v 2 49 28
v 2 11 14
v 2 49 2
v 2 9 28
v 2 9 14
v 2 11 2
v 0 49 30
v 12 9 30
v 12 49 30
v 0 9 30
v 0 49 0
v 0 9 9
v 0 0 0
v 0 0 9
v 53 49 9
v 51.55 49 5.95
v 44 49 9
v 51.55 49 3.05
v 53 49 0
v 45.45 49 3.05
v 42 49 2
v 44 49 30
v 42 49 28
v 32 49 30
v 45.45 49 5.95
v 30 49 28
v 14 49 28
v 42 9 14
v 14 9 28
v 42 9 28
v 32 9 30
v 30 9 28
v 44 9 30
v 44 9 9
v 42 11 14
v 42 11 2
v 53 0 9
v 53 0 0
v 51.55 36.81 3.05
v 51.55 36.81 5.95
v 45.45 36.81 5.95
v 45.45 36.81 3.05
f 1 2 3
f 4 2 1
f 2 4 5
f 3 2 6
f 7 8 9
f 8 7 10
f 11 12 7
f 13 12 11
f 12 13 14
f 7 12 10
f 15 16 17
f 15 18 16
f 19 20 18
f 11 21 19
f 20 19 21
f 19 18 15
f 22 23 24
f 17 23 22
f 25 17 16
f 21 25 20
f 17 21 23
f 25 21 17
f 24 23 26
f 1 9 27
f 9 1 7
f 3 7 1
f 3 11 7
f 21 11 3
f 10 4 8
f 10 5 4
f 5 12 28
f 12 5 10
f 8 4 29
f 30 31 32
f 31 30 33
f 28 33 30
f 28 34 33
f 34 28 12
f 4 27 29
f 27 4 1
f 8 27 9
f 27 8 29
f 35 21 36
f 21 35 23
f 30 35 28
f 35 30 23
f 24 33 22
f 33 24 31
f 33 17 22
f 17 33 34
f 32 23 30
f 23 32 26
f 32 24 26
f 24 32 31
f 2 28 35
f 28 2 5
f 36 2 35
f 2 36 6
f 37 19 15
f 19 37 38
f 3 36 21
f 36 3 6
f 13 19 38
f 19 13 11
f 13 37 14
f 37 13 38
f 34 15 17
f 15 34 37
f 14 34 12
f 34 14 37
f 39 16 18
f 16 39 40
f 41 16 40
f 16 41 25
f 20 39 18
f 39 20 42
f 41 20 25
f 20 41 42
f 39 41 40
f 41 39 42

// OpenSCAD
foldWidth = 9; 
holderWidth = 44;
Height = 40;
earbudsWidth = 30; 
scaleFactor = 1.9;


totalHeight = Height + foldWidth;
totalWidth = holderWidth + foldWidth;

module SidePannel() 
{
    translate([0, foldWidth, +scaleFactor])
    cube([2, Height, earbudsWidth - scaleFactor]);
    color("orange")
    translate([2,foldWidth,earbudsWidth-2])
    cube([10,Height,2]);

    color("silver")
    translate([12,foldWidth,earbudsWidth])
    triangle();
}

module magnetCutOut(xoffset,yoffset,zoffset) 
{
    xSize = 6.1;
    ySize = xSize *2;
    zSize = 2.9;
    translate([xoffset - xSize/2,yoffset- ySize,zoffset-zSize/2])
    cube([xSize,ySize,zSize]);
}

// This is the full back plate 
module BasePlate()
{    
    cube([totalWidth, totalHeight, 2]);
    cube([holderWidth, foldWidth, foldWidth]);
    translate([holderWidth ,0, 0])
    cube([foldWidth, Height + foldWidth, foldWidth]); 
}

module triangle()
{
    translate([0,0,-2])
    rotate(a=[-90,270,0])
    linear_extrude(height=Height)
    polygon(points = [[0,0],[2,0],[0,2]]);
}



module thing()
{
    translate([0,foldWidth,scaleFactor])
    cube([holderWidth,2,14 - scaleFactor]);
    color("green")
    translate([holderWidth,0,0])
    mirror(v=[totalWidth/2,0,0])
    {
        SidePannel();
    };
    
    SidePannel();
    
}


module roundedThing(roundRadious, sides)
{
    resize([holderWidth,Height,earbudsWidth])
    minkowski()
    {
        thing();
        sphere(roundRadious,$fn=sides);
    }
}

thing();
difference()
{
    BasePlate();
    translate([0,.01,0])
    magnetCutOut(holderWidth + foldWidth /2,totalHeight,foldWidth/2); 
}

/*minkowski()
    {
        thing();
        sphere(.155,$fn=10);
    };
*/
//BasePlate();
/*
difference()
{
    
    translate([-1,0,0])
    cube([1,100,50]);
}
BasePlate();
*/
